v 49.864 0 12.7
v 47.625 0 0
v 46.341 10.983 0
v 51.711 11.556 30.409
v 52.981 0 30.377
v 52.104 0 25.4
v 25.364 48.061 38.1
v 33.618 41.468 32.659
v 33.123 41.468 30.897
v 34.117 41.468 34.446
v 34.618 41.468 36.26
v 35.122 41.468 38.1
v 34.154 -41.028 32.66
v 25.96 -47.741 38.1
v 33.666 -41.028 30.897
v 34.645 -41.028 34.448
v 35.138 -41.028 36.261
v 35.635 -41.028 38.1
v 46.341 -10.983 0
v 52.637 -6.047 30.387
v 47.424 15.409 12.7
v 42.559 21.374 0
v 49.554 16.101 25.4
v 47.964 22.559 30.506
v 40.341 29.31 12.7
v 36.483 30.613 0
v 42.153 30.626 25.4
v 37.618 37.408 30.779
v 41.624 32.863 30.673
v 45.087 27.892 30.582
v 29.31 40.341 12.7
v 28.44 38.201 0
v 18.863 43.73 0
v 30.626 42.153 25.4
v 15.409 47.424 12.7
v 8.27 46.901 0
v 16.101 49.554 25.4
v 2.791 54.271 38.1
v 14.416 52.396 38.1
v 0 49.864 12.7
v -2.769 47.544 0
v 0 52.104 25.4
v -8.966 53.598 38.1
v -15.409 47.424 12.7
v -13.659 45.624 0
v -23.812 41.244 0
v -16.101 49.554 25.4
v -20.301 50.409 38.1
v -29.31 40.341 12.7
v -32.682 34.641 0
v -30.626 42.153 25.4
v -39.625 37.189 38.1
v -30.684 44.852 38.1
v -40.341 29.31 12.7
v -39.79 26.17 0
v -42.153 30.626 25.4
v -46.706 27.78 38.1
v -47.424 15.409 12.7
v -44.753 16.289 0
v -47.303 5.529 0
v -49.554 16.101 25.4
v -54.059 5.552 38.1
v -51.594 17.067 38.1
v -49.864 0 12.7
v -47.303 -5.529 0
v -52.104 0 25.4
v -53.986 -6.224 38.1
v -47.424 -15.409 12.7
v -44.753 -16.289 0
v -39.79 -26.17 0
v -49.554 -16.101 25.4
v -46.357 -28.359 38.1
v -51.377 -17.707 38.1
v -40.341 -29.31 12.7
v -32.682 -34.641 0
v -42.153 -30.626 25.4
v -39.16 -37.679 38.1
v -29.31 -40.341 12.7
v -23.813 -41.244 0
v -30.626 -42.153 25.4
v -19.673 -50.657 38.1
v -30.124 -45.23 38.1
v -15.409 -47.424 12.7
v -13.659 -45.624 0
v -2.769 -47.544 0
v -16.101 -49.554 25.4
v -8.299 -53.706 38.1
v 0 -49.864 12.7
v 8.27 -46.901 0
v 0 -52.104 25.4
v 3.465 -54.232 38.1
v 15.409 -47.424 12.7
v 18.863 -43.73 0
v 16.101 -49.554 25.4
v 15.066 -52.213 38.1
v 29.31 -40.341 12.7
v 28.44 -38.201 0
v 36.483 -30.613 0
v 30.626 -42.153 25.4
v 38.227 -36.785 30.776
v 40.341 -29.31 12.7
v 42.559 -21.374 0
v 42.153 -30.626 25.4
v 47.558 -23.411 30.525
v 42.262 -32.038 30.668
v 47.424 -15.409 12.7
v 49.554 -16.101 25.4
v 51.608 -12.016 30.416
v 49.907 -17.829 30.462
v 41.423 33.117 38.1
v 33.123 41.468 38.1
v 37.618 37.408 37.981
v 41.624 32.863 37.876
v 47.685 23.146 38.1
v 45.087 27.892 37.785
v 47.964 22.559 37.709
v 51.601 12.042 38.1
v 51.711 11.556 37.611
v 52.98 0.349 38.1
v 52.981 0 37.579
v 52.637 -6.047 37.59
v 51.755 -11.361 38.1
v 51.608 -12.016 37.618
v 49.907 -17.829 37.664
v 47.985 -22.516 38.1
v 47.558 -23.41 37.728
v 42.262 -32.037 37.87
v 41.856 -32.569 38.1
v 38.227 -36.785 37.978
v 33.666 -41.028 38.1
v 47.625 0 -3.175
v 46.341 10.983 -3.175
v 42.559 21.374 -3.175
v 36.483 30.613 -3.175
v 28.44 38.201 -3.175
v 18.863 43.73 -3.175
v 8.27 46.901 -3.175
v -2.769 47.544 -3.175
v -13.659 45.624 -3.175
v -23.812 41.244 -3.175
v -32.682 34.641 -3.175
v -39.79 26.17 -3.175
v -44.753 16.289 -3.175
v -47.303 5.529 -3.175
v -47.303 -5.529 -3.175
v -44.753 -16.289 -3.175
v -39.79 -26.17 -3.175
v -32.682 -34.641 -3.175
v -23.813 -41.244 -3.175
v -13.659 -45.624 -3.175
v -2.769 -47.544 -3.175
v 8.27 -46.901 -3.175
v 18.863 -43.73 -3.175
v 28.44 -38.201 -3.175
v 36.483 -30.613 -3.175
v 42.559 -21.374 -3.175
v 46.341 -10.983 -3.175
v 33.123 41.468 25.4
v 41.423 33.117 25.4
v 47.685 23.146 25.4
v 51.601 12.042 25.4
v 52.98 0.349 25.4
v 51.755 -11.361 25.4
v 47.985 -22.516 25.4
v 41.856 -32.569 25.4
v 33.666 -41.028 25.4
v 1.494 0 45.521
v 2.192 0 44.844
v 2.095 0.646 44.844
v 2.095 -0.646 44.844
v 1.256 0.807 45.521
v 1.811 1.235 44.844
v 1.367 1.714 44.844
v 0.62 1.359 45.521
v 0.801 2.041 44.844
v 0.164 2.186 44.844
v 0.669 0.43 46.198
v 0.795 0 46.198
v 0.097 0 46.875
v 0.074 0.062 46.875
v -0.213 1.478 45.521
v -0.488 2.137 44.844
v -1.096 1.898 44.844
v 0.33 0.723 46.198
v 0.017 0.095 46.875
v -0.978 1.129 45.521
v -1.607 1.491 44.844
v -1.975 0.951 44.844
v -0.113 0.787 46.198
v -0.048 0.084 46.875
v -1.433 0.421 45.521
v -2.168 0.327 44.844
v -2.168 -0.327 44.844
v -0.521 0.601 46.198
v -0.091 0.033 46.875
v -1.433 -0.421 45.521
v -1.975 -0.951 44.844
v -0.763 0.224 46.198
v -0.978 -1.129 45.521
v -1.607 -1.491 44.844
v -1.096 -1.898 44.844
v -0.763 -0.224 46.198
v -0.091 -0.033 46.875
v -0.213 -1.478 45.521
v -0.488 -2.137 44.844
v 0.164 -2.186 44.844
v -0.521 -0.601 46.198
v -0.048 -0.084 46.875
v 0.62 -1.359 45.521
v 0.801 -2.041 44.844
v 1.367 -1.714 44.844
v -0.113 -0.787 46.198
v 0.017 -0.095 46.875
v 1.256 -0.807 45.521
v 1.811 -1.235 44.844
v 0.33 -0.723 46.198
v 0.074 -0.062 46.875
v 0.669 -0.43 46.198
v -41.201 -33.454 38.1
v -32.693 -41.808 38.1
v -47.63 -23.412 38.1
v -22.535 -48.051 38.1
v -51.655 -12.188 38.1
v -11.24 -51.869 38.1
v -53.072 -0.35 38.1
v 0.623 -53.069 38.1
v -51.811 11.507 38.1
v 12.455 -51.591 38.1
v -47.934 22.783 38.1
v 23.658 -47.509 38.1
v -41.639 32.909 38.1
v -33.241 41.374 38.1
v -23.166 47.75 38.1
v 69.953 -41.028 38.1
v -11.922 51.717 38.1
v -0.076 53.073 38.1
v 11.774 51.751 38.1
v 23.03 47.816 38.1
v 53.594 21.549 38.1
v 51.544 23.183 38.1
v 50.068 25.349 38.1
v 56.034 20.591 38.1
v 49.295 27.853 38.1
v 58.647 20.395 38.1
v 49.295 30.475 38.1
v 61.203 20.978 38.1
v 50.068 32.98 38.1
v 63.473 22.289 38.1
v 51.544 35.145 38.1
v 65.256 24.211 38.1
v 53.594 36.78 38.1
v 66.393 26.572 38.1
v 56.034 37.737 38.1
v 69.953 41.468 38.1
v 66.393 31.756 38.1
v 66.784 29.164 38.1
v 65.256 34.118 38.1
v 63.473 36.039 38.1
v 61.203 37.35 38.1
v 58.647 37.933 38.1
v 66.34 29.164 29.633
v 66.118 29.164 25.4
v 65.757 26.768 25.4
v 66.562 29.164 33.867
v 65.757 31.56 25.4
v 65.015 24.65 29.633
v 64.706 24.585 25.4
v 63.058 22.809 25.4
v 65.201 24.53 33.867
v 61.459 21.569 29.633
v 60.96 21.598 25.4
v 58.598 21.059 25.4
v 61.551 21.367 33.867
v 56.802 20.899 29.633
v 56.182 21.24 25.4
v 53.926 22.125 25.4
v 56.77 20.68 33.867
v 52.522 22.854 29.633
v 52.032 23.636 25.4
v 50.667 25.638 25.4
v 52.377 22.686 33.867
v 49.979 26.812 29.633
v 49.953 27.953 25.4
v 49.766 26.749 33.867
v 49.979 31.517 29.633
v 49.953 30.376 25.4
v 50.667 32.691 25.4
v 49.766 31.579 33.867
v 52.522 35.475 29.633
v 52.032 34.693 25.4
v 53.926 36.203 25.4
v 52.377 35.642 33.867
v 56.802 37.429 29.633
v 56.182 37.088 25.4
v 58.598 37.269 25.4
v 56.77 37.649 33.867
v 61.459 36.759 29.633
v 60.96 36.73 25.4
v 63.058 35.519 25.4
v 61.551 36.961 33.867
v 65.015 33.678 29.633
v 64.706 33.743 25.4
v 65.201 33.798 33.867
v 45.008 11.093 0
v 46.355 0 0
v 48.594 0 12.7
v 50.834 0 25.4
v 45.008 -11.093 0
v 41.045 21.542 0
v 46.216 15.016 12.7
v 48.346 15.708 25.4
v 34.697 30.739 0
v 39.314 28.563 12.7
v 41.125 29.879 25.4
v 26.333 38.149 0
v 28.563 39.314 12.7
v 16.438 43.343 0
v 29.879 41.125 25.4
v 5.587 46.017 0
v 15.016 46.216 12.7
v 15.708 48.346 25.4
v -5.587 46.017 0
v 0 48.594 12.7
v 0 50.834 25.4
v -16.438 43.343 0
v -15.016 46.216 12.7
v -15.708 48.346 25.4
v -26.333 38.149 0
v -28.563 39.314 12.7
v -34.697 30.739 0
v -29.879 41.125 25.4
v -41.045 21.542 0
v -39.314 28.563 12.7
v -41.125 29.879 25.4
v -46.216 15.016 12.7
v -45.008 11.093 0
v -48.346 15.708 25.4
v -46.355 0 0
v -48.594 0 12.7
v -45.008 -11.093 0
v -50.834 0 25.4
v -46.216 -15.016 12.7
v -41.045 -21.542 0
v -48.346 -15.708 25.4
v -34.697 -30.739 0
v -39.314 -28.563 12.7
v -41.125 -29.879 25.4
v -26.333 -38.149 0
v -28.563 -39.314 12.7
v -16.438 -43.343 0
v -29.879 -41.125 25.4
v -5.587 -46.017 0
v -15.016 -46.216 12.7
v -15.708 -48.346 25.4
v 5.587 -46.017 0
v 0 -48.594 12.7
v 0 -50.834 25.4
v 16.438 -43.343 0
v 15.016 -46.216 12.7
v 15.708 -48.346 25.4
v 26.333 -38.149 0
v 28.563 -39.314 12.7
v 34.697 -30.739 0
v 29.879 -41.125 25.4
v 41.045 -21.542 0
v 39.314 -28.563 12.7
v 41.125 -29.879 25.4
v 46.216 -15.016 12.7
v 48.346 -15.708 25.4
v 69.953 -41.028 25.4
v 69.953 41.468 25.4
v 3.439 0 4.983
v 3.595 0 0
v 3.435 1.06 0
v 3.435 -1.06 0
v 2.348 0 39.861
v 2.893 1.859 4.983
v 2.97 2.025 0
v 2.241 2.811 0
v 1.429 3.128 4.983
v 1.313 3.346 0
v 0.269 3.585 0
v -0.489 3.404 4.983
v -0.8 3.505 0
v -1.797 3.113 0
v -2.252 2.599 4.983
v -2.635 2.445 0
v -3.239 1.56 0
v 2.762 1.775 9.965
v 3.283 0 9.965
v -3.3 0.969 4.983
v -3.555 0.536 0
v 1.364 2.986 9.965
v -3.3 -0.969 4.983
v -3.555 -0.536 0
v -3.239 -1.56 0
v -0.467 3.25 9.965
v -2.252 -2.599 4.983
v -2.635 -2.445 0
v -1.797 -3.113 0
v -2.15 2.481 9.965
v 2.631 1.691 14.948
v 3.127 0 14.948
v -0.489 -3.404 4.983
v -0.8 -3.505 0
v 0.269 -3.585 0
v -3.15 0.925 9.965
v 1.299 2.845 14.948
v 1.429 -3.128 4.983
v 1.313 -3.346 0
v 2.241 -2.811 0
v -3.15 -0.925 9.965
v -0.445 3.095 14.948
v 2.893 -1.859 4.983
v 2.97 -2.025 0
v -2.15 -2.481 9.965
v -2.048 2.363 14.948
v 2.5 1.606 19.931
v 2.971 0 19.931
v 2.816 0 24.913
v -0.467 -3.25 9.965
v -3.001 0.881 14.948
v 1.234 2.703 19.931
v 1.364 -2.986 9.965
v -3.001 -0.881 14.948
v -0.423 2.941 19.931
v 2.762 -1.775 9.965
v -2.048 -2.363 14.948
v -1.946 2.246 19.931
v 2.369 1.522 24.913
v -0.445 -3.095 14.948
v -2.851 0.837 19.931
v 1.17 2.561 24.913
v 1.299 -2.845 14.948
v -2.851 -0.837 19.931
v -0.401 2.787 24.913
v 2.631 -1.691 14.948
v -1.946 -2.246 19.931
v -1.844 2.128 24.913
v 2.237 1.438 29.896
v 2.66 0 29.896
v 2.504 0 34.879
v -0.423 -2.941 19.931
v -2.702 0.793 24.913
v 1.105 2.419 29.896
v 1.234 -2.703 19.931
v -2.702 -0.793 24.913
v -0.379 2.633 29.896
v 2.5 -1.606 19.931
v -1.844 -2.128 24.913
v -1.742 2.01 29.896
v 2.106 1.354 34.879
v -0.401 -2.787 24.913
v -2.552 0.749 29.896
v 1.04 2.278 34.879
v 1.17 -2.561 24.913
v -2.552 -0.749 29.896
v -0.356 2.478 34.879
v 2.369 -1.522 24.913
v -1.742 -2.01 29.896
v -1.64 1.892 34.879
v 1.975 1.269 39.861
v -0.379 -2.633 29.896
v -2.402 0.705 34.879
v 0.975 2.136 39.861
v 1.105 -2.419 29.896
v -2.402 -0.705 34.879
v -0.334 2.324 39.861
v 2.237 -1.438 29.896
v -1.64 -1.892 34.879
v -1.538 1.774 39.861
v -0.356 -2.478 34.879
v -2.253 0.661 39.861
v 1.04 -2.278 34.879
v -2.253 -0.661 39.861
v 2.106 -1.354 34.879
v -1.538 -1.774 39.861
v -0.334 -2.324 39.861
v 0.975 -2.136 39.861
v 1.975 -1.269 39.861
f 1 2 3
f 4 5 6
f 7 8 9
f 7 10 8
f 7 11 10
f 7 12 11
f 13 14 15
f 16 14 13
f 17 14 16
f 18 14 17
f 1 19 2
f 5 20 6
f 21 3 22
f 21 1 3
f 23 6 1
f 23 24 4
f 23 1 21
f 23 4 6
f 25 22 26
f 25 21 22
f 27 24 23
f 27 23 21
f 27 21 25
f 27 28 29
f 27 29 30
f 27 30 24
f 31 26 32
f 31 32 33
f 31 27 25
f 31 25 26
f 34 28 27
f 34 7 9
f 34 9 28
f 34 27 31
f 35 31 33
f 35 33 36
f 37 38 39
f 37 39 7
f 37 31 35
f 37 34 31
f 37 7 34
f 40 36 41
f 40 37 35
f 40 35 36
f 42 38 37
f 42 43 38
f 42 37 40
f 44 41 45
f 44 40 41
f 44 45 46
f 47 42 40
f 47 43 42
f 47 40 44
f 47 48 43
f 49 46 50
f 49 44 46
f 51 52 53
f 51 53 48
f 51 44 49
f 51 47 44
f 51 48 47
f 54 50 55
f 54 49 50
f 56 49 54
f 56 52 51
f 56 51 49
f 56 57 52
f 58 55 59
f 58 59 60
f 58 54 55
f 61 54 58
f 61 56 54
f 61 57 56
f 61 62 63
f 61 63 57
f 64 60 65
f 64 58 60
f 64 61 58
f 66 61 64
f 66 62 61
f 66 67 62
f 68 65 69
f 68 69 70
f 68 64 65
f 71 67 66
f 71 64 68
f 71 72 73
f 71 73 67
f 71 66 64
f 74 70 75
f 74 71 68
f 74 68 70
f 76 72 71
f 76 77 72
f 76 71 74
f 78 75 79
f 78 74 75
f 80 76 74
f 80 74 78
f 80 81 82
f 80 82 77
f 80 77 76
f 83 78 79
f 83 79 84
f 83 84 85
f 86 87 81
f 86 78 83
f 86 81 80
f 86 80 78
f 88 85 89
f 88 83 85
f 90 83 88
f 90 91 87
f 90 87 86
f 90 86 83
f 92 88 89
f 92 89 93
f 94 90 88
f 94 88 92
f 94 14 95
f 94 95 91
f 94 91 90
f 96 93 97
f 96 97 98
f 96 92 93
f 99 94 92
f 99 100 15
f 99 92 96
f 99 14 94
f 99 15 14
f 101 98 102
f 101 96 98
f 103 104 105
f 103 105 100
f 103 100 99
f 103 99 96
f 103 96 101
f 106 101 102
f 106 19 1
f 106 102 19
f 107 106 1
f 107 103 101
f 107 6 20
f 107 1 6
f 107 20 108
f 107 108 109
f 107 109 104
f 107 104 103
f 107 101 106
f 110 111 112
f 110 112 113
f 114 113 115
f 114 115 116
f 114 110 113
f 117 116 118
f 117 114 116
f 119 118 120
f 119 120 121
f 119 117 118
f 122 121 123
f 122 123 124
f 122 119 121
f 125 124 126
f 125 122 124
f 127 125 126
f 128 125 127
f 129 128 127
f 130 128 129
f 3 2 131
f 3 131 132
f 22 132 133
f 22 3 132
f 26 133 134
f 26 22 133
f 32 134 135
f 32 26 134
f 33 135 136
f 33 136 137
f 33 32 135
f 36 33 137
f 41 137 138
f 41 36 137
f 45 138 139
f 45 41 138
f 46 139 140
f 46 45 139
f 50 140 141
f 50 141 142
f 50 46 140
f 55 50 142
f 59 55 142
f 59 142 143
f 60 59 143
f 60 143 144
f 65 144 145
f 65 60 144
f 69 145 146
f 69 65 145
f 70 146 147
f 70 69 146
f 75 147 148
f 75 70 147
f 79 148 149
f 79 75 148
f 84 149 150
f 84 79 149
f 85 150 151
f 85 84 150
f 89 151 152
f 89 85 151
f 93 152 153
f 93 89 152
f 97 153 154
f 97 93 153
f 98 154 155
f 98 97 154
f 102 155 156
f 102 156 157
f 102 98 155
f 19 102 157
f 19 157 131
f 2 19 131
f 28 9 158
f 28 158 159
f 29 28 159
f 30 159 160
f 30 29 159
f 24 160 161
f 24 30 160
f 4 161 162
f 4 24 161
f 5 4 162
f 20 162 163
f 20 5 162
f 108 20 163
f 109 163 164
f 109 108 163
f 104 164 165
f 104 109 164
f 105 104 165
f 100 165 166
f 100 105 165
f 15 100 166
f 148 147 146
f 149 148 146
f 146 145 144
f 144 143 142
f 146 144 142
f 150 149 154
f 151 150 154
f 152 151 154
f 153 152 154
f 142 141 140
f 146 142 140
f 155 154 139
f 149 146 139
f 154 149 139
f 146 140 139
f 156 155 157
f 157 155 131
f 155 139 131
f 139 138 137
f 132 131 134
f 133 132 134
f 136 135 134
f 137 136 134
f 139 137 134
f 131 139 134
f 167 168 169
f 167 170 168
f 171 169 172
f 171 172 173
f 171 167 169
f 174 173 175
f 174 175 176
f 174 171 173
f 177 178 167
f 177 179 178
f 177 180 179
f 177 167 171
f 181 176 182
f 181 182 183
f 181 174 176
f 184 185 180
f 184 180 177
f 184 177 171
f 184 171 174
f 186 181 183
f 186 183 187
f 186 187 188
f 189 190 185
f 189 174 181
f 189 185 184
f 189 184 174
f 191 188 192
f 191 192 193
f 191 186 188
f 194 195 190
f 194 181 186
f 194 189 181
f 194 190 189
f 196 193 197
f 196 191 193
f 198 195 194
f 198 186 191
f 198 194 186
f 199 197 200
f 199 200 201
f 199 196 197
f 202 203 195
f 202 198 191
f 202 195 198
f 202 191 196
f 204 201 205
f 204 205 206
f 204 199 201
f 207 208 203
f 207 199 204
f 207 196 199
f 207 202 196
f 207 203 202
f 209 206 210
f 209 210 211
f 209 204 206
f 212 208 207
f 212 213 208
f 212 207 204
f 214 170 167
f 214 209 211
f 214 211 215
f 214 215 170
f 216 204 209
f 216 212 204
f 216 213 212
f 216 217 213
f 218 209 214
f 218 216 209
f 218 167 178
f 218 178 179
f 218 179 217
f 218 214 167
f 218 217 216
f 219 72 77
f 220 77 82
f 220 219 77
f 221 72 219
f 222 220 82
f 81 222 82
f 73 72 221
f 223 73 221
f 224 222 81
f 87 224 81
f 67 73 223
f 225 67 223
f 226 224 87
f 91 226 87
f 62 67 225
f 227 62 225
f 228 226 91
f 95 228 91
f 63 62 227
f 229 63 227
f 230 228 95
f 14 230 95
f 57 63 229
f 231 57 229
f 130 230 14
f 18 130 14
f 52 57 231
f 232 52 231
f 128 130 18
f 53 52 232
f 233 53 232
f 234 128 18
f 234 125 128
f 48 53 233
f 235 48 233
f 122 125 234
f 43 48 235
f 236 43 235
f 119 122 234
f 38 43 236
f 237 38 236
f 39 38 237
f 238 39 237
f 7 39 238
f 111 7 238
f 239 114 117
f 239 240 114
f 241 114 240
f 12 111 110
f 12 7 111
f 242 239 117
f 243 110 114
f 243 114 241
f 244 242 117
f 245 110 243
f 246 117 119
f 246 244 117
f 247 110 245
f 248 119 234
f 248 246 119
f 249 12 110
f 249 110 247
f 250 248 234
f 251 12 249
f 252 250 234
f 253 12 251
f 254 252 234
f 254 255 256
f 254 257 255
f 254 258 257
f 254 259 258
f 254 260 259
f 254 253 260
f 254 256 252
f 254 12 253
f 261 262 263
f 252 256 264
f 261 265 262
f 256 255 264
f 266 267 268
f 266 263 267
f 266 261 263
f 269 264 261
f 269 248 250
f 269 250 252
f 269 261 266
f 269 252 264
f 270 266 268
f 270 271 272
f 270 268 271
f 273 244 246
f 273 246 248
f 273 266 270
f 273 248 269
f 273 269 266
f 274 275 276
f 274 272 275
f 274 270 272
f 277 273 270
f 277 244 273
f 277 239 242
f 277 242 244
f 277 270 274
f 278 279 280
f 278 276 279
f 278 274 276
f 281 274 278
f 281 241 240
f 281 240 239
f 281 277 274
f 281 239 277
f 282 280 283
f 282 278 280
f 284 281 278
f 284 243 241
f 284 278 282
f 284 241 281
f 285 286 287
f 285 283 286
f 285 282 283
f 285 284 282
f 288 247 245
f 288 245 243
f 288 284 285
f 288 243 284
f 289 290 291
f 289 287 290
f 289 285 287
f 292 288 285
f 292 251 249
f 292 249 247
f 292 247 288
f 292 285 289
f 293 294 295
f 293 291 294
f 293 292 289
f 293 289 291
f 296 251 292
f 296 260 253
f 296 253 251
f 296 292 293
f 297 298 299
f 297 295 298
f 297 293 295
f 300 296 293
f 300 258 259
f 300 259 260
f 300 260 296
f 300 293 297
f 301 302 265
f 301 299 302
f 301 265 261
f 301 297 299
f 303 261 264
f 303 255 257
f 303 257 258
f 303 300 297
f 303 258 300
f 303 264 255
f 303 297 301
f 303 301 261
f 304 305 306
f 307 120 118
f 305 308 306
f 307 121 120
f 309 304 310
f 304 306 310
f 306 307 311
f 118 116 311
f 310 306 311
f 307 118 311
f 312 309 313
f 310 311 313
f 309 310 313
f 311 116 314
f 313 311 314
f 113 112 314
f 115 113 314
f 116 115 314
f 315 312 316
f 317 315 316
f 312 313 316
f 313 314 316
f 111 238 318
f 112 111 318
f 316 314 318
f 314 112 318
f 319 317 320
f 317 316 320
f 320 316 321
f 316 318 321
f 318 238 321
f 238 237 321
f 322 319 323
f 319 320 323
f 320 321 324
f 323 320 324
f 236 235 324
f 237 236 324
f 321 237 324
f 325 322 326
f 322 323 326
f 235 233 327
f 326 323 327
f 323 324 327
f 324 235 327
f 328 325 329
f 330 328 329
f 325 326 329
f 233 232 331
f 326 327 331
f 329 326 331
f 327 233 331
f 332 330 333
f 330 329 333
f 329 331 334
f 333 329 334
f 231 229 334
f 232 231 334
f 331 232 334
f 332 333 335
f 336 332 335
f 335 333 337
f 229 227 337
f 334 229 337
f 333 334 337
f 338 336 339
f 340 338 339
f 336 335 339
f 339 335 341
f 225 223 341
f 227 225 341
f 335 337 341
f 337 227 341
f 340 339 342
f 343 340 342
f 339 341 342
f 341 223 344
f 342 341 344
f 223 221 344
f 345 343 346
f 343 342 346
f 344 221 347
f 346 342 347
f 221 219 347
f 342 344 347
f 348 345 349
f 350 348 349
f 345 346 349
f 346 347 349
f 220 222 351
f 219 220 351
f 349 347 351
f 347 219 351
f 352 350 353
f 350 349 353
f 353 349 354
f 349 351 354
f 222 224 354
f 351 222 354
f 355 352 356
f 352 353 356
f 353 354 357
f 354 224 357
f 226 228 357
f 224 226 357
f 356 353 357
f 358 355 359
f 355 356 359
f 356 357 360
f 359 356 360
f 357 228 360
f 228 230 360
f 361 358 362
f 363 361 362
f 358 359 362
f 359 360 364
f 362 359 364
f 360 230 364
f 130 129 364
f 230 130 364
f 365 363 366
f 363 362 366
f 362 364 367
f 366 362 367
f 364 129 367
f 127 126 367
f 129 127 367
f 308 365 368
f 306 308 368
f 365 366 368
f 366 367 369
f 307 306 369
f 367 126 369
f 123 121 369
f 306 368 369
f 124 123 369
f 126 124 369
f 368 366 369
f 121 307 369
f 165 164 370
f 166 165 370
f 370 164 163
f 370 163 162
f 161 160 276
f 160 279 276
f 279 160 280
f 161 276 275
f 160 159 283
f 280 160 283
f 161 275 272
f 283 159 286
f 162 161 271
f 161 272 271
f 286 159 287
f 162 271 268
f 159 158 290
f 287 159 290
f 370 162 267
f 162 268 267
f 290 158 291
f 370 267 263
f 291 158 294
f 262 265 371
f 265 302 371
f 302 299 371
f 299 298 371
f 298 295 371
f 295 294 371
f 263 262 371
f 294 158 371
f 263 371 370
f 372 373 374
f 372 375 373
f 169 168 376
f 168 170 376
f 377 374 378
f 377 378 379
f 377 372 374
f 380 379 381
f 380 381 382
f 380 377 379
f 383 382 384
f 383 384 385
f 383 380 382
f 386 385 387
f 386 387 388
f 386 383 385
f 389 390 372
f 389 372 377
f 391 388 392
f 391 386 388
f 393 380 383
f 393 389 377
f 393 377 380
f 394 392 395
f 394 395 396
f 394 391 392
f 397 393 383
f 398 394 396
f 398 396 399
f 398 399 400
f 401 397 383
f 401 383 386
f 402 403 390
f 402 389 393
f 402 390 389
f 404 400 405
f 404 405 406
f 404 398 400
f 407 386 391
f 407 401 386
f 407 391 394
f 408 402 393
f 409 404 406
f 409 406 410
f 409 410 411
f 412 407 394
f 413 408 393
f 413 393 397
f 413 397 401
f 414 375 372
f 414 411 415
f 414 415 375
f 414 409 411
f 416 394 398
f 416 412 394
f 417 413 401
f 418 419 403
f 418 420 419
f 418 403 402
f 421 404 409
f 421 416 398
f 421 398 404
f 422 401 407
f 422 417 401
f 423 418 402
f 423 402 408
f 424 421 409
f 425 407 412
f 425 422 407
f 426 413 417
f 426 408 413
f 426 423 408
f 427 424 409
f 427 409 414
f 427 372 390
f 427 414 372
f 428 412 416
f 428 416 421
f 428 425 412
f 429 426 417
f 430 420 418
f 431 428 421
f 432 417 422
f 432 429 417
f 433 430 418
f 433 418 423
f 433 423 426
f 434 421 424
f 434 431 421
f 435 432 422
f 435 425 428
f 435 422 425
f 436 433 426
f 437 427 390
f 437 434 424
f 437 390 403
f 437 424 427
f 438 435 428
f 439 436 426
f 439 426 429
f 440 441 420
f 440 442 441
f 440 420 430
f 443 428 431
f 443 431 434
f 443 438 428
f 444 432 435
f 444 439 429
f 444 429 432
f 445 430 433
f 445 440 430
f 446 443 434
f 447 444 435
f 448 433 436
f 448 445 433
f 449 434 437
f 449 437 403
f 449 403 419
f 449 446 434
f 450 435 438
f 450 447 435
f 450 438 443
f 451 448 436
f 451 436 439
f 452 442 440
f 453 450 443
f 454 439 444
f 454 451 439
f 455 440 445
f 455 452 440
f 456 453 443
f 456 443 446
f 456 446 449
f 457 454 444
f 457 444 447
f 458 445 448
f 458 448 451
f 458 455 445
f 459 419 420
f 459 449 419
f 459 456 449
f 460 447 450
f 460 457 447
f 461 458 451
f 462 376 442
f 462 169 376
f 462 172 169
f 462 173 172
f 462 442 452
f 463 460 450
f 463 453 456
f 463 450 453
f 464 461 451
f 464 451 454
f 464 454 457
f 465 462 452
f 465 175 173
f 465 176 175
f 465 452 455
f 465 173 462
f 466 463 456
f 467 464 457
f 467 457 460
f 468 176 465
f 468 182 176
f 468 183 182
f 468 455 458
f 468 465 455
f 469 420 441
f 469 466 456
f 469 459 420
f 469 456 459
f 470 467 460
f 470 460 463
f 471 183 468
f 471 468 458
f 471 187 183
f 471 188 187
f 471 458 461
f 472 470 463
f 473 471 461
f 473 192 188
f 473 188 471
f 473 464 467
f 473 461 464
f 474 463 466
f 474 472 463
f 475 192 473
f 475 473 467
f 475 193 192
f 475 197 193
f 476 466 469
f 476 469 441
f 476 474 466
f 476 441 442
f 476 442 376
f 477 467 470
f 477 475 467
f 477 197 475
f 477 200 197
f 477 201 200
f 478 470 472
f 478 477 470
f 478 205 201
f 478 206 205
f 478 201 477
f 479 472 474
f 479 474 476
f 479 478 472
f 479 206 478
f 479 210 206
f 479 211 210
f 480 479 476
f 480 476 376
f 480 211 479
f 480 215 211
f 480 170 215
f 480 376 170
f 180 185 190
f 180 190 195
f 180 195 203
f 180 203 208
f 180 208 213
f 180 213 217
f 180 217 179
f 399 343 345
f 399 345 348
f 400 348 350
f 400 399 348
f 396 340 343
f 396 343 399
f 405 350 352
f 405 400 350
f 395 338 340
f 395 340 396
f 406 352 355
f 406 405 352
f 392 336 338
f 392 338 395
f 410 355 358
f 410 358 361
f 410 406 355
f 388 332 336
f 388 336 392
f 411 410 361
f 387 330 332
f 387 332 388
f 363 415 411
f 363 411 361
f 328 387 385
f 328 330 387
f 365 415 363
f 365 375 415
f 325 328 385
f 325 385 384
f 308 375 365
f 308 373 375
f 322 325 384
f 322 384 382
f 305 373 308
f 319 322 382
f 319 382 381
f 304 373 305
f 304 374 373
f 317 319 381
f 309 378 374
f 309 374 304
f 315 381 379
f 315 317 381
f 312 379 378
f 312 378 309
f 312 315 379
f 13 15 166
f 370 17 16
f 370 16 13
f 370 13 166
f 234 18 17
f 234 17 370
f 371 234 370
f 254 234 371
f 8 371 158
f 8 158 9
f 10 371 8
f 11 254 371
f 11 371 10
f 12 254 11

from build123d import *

# Parameters (mm, degrees)
F0_R      = 47.625
F1_DEPTH  = 38.1
F1_TAPER  = -10
F2_R      = 46.355
F3_DEPTH  = 38.1
F3_TAPER  = -10
F4_DEPTH  = 3.175
F7_SIZE   = 2.032
F9_DEPTH  = 12.7
F10_R     = 8.128
F11_DEPTH = 25.4
F11_TAPER = -3


with BuildPart() as f1:
    # F0 (on Top) → F1 (new body)
    with BuildSketch(Plane.XY):
        Circle(F0_R)
    extrude(amount=F1_DEPTH, taper=F1_TAPER)

    # F2 (on Top) → F3 (cut)
    with BuildSketch(Plane.XY):
        Circle(F2_R)
    extrude(amount=F3_DEPTH, taper=F3_TAPER, mode=Mode.SUBTRACT)

    # F0 (on Top) → F4 (join)
    with BuildSketch(Plane.XY):
        Circle(F0_R)
    extrude(amount=-F4_DEPTH)

    # F5 (on Front) → F6 (revolve)
    with BuildSketch(Plane.XZ):
        Polygon((0, 46.8748211861), (0, 0), (3.5949361045, 0), (2.1285163239, 46.8748211861), align=None)
    revolve(axis=Axis((0, 0, 0), (0, 0, 1)))

    # F7
    f7_edges = [f1.edges().sort_by_distance(p)[0] for p in [
        (-2.128516, 0, 46.874821),
    ]]
    chamfer(f7_edges, length=F7_SIZE)

    # F8 (on face) → F9 (join)
    with BuildSketch(Plane.XY.offset(38.1)):
        with BuildLine():
            Line((69.9530094796, 41.4682495986), (33.1230094796, 41.4682495986))
            ThreePointArc((33.1230094796, 41.4682495986), (52.9801221963, 0.348952149), (33.6663710675, -41.0283431411))
            Line((33.6663710675, -41.0283431411), (69.9530094796, -41.0283431411))
            Line((69.9530094796, -41.0283431411), (69.9530094796, 41.4682495986))
        make_face()
    extrude(amount=-F9_DEPTH)

    # F10 (on face) → F11 (cut)
    with BuildSketch(Plane(origin=(0, 0, 25.4), x_dir=(1, 0, 0), z_dir=(0, 0, -1))):
        with Locations((57.9903379162, -29.164113198)):
            Circle(F10_R)
    extrude(amount=-F11_DEPTH, taper=F11_TAPER, mode=Mode.SUBTRACT)


solid = f1.part
